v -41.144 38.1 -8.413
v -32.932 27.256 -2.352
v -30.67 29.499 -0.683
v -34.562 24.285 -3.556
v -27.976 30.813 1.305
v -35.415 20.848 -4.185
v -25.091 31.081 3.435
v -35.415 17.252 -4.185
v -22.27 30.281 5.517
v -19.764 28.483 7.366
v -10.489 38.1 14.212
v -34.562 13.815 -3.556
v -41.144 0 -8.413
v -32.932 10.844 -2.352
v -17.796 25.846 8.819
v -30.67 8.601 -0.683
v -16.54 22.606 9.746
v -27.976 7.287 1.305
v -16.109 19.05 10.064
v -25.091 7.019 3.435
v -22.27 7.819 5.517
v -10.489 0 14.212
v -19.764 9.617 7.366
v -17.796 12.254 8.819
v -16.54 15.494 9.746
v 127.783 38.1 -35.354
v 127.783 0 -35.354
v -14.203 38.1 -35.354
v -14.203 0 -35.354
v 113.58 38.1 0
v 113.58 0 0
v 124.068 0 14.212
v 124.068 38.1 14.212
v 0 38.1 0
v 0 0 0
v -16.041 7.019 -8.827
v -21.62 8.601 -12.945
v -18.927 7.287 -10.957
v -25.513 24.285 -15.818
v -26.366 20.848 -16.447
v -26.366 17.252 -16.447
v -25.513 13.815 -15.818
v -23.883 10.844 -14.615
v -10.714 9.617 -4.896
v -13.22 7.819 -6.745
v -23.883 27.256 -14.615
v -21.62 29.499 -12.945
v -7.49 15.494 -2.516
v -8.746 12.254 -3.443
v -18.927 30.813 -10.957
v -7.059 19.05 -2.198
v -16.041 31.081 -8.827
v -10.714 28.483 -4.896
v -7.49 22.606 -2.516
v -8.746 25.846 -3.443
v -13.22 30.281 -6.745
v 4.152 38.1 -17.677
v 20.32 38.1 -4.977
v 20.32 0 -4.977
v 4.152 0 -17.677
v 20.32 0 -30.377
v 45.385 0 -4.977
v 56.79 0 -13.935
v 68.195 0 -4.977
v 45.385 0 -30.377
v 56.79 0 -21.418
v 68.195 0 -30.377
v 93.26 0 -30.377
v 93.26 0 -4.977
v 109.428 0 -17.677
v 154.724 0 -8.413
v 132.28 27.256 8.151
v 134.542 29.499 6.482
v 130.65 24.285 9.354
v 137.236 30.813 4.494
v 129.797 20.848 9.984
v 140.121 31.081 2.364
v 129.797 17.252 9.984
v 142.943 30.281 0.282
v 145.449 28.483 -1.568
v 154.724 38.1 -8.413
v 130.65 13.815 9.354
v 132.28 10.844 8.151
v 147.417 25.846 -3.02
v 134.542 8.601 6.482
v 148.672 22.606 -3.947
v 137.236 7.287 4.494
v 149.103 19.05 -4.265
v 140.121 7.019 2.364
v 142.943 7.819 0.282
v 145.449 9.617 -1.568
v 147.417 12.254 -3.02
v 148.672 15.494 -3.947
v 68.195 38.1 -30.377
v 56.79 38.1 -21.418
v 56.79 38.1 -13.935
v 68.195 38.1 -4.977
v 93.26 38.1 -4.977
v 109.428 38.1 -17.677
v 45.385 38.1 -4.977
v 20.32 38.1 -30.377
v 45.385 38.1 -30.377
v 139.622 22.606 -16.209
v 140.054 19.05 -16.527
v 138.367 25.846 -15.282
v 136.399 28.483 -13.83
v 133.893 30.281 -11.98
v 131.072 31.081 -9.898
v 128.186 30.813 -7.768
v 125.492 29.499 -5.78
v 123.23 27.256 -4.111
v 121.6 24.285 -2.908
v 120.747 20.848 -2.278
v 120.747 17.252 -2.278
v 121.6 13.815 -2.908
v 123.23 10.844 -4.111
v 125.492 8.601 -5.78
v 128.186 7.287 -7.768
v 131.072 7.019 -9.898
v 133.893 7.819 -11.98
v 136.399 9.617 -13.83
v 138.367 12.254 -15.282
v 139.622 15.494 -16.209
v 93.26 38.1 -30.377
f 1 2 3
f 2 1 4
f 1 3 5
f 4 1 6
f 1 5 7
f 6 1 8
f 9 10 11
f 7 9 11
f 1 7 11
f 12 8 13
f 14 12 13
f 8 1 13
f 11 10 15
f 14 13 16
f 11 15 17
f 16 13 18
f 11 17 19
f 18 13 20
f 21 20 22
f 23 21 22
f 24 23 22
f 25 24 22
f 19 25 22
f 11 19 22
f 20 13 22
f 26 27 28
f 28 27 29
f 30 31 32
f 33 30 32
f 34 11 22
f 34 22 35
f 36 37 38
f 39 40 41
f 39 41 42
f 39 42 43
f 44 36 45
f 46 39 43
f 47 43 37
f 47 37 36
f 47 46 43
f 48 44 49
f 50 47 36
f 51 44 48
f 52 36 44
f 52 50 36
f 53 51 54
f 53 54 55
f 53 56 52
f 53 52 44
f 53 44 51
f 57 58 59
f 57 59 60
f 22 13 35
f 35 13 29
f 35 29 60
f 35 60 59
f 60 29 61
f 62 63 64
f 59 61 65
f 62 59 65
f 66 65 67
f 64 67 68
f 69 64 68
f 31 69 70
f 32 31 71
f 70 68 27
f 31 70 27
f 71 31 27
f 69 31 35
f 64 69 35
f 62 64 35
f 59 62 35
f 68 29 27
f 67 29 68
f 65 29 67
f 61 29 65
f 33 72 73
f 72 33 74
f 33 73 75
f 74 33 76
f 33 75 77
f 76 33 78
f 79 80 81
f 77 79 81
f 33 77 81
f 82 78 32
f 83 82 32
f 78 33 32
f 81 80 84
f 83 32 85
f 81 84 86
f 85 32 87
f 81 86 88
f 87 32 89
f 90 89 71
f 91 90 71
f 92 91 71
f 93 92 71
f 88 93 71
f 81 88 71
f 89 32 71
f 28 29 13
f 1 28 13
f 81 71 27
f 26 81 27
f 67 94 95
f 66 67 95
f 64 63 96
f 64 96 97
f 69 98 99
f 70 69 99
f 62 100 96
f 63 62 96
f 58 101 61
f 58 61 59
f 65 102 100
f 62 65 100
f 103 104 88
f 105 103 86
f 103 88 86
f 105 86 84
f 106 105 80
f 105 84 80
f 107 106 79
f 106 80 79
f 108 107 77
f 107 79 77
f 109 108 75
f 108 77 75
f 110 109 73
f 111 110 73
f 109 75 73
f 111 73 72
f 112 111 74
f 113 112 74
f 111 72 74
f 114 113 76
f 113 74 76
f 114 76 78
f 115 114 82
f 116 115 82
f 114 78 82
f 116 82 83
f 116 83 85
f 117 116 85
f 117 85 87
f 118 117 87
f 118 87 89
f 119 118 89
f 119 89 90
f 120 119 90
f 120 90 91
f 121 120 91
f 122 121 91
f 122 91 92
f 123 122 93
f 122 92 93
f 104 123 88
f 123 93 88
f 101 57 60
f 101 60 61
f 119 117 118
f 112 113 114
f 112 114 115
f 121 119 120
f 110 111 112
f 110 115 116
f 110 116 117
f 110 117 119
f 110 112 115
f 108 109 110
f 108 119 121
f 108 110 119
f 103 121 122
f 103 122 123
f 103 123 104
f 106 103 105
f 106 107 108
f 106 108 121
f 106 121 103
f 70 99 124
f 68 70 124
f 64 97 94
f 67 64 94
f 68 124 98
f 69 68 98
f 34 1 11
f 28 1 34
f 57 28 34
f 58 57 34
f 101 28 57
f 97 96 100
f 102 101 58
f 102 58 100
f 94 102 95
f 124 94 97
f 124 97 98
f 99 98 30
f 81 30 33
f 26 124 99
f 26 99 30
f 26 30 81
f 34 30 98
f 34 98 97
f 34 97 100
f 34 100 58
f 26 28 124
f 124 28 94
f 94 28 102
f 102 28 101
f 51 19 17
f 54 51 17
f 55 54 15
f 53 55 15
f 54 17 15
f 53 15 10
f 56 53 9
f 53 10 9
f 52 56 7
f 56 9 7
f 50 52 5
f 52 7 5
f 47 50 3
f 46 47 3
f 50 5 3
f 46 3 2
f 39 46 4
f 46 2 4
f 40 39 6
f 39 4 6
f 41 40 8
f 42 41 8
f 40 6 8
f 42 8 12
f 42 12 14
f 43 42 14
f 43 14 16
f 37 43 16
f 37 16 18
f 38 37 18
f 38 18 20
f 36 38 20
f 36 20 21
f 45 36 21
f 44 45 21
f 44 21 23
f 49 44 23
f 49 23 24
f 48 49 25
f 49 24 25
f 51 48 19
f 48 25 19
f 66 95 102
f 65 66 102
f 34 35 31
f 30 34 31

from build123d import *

# Parameters (mm, degrees)
BOSS_EXTRUDE1_DEPTH = 38.1
SKETCH2_R           = 12.065
CUT_EXTRUDE1_DEPTH  = 15.24
SKETCH3_R           = 12.065
CUT_EXTRUDE2_DEPTH  = 15.24
CUT_EXTRUDE3_DEPTH  = 38.1


with BuildPart() as part:
    # Sketch1 → Boss-Extrude1 (new body)
    with BuildSketch(Plane(origin=(0, 0, 0), x_dir=(1, 0, 0), z_dir=(0, 1, 0))):
        Polygon((0, 0), (113.579665808, 0), (124.068494586, -14.211767965), (154.723601267, 8.412874228), (127.782832904, 35.353642591), (-14.203167096, 35.353642591), (-41.143935459, 8.412874228), (-10.488828778, -14.211767965), align=None)
    extrude(amount=BOSS_EXTRUDE1_DEPTH)

    # Sketch2 → Cut-Extrude1 (cut)
    with BuildSketch(Plane(origin=(-10.488828778, 0, 14.211767965), x_dir=(0.8045959758833214, 0, 0.5938226297408727), z_dir=(-0.5938226297408727, 0, 0.8045959758833214))):
        with Locations((-19.05, 19.05)):
            Circle(SKETCH2_R)
    extrude(amount=-CUT_EXTRUDE1_DEPTH, mode=Mode.SUBTRACT)

    # Sketch3 → Cut-Extrude2 (cut)
    with BuildSketch(Plane(origin=(50.539894278, 0, 68.478689631), x_dir=(0.8045959758833213, 0, -0.5938226297408729), z_dir=(0.5938226297408729, 0, 0.8045959758833213))):
        with Locations((110.435742051, 19.05)):
            Circle(SKETCH3_R)
    extrude(amount=-CUT_EXTRUDE2_DEPTH, mode=Mode.SUBTRACT)

    # Sketch5 → Cut-Extrude3 (cut)
    with BuildSketch(Plane(origin=(0, 38.1, 0), x_dir=(1, 0, 0), z_dir=(0, 1, 0))):
        Polygon((4.151555437, 17.676821295), (20.32, 30.376821295), (20.32, 4.976821295), align=None)
        Polygon((45.384535252, 30.376821295), (45.384535252, 4.976821295), (56.789832904, 13.935461665), (68.195130556, 4.976821295), (68.195130556, 30.376821295), (56.789832904, 21.418180926), align=None)
        Polygon((93.259665808, 30.376821295), (93.259665808, 4.976821295), (109.428110371, 17.676821295), align=None)
    extrude(amount=-CUT_EXTRUDE3_DEPTH, mode=Mode.SUBTRACT)


solid = part.part
